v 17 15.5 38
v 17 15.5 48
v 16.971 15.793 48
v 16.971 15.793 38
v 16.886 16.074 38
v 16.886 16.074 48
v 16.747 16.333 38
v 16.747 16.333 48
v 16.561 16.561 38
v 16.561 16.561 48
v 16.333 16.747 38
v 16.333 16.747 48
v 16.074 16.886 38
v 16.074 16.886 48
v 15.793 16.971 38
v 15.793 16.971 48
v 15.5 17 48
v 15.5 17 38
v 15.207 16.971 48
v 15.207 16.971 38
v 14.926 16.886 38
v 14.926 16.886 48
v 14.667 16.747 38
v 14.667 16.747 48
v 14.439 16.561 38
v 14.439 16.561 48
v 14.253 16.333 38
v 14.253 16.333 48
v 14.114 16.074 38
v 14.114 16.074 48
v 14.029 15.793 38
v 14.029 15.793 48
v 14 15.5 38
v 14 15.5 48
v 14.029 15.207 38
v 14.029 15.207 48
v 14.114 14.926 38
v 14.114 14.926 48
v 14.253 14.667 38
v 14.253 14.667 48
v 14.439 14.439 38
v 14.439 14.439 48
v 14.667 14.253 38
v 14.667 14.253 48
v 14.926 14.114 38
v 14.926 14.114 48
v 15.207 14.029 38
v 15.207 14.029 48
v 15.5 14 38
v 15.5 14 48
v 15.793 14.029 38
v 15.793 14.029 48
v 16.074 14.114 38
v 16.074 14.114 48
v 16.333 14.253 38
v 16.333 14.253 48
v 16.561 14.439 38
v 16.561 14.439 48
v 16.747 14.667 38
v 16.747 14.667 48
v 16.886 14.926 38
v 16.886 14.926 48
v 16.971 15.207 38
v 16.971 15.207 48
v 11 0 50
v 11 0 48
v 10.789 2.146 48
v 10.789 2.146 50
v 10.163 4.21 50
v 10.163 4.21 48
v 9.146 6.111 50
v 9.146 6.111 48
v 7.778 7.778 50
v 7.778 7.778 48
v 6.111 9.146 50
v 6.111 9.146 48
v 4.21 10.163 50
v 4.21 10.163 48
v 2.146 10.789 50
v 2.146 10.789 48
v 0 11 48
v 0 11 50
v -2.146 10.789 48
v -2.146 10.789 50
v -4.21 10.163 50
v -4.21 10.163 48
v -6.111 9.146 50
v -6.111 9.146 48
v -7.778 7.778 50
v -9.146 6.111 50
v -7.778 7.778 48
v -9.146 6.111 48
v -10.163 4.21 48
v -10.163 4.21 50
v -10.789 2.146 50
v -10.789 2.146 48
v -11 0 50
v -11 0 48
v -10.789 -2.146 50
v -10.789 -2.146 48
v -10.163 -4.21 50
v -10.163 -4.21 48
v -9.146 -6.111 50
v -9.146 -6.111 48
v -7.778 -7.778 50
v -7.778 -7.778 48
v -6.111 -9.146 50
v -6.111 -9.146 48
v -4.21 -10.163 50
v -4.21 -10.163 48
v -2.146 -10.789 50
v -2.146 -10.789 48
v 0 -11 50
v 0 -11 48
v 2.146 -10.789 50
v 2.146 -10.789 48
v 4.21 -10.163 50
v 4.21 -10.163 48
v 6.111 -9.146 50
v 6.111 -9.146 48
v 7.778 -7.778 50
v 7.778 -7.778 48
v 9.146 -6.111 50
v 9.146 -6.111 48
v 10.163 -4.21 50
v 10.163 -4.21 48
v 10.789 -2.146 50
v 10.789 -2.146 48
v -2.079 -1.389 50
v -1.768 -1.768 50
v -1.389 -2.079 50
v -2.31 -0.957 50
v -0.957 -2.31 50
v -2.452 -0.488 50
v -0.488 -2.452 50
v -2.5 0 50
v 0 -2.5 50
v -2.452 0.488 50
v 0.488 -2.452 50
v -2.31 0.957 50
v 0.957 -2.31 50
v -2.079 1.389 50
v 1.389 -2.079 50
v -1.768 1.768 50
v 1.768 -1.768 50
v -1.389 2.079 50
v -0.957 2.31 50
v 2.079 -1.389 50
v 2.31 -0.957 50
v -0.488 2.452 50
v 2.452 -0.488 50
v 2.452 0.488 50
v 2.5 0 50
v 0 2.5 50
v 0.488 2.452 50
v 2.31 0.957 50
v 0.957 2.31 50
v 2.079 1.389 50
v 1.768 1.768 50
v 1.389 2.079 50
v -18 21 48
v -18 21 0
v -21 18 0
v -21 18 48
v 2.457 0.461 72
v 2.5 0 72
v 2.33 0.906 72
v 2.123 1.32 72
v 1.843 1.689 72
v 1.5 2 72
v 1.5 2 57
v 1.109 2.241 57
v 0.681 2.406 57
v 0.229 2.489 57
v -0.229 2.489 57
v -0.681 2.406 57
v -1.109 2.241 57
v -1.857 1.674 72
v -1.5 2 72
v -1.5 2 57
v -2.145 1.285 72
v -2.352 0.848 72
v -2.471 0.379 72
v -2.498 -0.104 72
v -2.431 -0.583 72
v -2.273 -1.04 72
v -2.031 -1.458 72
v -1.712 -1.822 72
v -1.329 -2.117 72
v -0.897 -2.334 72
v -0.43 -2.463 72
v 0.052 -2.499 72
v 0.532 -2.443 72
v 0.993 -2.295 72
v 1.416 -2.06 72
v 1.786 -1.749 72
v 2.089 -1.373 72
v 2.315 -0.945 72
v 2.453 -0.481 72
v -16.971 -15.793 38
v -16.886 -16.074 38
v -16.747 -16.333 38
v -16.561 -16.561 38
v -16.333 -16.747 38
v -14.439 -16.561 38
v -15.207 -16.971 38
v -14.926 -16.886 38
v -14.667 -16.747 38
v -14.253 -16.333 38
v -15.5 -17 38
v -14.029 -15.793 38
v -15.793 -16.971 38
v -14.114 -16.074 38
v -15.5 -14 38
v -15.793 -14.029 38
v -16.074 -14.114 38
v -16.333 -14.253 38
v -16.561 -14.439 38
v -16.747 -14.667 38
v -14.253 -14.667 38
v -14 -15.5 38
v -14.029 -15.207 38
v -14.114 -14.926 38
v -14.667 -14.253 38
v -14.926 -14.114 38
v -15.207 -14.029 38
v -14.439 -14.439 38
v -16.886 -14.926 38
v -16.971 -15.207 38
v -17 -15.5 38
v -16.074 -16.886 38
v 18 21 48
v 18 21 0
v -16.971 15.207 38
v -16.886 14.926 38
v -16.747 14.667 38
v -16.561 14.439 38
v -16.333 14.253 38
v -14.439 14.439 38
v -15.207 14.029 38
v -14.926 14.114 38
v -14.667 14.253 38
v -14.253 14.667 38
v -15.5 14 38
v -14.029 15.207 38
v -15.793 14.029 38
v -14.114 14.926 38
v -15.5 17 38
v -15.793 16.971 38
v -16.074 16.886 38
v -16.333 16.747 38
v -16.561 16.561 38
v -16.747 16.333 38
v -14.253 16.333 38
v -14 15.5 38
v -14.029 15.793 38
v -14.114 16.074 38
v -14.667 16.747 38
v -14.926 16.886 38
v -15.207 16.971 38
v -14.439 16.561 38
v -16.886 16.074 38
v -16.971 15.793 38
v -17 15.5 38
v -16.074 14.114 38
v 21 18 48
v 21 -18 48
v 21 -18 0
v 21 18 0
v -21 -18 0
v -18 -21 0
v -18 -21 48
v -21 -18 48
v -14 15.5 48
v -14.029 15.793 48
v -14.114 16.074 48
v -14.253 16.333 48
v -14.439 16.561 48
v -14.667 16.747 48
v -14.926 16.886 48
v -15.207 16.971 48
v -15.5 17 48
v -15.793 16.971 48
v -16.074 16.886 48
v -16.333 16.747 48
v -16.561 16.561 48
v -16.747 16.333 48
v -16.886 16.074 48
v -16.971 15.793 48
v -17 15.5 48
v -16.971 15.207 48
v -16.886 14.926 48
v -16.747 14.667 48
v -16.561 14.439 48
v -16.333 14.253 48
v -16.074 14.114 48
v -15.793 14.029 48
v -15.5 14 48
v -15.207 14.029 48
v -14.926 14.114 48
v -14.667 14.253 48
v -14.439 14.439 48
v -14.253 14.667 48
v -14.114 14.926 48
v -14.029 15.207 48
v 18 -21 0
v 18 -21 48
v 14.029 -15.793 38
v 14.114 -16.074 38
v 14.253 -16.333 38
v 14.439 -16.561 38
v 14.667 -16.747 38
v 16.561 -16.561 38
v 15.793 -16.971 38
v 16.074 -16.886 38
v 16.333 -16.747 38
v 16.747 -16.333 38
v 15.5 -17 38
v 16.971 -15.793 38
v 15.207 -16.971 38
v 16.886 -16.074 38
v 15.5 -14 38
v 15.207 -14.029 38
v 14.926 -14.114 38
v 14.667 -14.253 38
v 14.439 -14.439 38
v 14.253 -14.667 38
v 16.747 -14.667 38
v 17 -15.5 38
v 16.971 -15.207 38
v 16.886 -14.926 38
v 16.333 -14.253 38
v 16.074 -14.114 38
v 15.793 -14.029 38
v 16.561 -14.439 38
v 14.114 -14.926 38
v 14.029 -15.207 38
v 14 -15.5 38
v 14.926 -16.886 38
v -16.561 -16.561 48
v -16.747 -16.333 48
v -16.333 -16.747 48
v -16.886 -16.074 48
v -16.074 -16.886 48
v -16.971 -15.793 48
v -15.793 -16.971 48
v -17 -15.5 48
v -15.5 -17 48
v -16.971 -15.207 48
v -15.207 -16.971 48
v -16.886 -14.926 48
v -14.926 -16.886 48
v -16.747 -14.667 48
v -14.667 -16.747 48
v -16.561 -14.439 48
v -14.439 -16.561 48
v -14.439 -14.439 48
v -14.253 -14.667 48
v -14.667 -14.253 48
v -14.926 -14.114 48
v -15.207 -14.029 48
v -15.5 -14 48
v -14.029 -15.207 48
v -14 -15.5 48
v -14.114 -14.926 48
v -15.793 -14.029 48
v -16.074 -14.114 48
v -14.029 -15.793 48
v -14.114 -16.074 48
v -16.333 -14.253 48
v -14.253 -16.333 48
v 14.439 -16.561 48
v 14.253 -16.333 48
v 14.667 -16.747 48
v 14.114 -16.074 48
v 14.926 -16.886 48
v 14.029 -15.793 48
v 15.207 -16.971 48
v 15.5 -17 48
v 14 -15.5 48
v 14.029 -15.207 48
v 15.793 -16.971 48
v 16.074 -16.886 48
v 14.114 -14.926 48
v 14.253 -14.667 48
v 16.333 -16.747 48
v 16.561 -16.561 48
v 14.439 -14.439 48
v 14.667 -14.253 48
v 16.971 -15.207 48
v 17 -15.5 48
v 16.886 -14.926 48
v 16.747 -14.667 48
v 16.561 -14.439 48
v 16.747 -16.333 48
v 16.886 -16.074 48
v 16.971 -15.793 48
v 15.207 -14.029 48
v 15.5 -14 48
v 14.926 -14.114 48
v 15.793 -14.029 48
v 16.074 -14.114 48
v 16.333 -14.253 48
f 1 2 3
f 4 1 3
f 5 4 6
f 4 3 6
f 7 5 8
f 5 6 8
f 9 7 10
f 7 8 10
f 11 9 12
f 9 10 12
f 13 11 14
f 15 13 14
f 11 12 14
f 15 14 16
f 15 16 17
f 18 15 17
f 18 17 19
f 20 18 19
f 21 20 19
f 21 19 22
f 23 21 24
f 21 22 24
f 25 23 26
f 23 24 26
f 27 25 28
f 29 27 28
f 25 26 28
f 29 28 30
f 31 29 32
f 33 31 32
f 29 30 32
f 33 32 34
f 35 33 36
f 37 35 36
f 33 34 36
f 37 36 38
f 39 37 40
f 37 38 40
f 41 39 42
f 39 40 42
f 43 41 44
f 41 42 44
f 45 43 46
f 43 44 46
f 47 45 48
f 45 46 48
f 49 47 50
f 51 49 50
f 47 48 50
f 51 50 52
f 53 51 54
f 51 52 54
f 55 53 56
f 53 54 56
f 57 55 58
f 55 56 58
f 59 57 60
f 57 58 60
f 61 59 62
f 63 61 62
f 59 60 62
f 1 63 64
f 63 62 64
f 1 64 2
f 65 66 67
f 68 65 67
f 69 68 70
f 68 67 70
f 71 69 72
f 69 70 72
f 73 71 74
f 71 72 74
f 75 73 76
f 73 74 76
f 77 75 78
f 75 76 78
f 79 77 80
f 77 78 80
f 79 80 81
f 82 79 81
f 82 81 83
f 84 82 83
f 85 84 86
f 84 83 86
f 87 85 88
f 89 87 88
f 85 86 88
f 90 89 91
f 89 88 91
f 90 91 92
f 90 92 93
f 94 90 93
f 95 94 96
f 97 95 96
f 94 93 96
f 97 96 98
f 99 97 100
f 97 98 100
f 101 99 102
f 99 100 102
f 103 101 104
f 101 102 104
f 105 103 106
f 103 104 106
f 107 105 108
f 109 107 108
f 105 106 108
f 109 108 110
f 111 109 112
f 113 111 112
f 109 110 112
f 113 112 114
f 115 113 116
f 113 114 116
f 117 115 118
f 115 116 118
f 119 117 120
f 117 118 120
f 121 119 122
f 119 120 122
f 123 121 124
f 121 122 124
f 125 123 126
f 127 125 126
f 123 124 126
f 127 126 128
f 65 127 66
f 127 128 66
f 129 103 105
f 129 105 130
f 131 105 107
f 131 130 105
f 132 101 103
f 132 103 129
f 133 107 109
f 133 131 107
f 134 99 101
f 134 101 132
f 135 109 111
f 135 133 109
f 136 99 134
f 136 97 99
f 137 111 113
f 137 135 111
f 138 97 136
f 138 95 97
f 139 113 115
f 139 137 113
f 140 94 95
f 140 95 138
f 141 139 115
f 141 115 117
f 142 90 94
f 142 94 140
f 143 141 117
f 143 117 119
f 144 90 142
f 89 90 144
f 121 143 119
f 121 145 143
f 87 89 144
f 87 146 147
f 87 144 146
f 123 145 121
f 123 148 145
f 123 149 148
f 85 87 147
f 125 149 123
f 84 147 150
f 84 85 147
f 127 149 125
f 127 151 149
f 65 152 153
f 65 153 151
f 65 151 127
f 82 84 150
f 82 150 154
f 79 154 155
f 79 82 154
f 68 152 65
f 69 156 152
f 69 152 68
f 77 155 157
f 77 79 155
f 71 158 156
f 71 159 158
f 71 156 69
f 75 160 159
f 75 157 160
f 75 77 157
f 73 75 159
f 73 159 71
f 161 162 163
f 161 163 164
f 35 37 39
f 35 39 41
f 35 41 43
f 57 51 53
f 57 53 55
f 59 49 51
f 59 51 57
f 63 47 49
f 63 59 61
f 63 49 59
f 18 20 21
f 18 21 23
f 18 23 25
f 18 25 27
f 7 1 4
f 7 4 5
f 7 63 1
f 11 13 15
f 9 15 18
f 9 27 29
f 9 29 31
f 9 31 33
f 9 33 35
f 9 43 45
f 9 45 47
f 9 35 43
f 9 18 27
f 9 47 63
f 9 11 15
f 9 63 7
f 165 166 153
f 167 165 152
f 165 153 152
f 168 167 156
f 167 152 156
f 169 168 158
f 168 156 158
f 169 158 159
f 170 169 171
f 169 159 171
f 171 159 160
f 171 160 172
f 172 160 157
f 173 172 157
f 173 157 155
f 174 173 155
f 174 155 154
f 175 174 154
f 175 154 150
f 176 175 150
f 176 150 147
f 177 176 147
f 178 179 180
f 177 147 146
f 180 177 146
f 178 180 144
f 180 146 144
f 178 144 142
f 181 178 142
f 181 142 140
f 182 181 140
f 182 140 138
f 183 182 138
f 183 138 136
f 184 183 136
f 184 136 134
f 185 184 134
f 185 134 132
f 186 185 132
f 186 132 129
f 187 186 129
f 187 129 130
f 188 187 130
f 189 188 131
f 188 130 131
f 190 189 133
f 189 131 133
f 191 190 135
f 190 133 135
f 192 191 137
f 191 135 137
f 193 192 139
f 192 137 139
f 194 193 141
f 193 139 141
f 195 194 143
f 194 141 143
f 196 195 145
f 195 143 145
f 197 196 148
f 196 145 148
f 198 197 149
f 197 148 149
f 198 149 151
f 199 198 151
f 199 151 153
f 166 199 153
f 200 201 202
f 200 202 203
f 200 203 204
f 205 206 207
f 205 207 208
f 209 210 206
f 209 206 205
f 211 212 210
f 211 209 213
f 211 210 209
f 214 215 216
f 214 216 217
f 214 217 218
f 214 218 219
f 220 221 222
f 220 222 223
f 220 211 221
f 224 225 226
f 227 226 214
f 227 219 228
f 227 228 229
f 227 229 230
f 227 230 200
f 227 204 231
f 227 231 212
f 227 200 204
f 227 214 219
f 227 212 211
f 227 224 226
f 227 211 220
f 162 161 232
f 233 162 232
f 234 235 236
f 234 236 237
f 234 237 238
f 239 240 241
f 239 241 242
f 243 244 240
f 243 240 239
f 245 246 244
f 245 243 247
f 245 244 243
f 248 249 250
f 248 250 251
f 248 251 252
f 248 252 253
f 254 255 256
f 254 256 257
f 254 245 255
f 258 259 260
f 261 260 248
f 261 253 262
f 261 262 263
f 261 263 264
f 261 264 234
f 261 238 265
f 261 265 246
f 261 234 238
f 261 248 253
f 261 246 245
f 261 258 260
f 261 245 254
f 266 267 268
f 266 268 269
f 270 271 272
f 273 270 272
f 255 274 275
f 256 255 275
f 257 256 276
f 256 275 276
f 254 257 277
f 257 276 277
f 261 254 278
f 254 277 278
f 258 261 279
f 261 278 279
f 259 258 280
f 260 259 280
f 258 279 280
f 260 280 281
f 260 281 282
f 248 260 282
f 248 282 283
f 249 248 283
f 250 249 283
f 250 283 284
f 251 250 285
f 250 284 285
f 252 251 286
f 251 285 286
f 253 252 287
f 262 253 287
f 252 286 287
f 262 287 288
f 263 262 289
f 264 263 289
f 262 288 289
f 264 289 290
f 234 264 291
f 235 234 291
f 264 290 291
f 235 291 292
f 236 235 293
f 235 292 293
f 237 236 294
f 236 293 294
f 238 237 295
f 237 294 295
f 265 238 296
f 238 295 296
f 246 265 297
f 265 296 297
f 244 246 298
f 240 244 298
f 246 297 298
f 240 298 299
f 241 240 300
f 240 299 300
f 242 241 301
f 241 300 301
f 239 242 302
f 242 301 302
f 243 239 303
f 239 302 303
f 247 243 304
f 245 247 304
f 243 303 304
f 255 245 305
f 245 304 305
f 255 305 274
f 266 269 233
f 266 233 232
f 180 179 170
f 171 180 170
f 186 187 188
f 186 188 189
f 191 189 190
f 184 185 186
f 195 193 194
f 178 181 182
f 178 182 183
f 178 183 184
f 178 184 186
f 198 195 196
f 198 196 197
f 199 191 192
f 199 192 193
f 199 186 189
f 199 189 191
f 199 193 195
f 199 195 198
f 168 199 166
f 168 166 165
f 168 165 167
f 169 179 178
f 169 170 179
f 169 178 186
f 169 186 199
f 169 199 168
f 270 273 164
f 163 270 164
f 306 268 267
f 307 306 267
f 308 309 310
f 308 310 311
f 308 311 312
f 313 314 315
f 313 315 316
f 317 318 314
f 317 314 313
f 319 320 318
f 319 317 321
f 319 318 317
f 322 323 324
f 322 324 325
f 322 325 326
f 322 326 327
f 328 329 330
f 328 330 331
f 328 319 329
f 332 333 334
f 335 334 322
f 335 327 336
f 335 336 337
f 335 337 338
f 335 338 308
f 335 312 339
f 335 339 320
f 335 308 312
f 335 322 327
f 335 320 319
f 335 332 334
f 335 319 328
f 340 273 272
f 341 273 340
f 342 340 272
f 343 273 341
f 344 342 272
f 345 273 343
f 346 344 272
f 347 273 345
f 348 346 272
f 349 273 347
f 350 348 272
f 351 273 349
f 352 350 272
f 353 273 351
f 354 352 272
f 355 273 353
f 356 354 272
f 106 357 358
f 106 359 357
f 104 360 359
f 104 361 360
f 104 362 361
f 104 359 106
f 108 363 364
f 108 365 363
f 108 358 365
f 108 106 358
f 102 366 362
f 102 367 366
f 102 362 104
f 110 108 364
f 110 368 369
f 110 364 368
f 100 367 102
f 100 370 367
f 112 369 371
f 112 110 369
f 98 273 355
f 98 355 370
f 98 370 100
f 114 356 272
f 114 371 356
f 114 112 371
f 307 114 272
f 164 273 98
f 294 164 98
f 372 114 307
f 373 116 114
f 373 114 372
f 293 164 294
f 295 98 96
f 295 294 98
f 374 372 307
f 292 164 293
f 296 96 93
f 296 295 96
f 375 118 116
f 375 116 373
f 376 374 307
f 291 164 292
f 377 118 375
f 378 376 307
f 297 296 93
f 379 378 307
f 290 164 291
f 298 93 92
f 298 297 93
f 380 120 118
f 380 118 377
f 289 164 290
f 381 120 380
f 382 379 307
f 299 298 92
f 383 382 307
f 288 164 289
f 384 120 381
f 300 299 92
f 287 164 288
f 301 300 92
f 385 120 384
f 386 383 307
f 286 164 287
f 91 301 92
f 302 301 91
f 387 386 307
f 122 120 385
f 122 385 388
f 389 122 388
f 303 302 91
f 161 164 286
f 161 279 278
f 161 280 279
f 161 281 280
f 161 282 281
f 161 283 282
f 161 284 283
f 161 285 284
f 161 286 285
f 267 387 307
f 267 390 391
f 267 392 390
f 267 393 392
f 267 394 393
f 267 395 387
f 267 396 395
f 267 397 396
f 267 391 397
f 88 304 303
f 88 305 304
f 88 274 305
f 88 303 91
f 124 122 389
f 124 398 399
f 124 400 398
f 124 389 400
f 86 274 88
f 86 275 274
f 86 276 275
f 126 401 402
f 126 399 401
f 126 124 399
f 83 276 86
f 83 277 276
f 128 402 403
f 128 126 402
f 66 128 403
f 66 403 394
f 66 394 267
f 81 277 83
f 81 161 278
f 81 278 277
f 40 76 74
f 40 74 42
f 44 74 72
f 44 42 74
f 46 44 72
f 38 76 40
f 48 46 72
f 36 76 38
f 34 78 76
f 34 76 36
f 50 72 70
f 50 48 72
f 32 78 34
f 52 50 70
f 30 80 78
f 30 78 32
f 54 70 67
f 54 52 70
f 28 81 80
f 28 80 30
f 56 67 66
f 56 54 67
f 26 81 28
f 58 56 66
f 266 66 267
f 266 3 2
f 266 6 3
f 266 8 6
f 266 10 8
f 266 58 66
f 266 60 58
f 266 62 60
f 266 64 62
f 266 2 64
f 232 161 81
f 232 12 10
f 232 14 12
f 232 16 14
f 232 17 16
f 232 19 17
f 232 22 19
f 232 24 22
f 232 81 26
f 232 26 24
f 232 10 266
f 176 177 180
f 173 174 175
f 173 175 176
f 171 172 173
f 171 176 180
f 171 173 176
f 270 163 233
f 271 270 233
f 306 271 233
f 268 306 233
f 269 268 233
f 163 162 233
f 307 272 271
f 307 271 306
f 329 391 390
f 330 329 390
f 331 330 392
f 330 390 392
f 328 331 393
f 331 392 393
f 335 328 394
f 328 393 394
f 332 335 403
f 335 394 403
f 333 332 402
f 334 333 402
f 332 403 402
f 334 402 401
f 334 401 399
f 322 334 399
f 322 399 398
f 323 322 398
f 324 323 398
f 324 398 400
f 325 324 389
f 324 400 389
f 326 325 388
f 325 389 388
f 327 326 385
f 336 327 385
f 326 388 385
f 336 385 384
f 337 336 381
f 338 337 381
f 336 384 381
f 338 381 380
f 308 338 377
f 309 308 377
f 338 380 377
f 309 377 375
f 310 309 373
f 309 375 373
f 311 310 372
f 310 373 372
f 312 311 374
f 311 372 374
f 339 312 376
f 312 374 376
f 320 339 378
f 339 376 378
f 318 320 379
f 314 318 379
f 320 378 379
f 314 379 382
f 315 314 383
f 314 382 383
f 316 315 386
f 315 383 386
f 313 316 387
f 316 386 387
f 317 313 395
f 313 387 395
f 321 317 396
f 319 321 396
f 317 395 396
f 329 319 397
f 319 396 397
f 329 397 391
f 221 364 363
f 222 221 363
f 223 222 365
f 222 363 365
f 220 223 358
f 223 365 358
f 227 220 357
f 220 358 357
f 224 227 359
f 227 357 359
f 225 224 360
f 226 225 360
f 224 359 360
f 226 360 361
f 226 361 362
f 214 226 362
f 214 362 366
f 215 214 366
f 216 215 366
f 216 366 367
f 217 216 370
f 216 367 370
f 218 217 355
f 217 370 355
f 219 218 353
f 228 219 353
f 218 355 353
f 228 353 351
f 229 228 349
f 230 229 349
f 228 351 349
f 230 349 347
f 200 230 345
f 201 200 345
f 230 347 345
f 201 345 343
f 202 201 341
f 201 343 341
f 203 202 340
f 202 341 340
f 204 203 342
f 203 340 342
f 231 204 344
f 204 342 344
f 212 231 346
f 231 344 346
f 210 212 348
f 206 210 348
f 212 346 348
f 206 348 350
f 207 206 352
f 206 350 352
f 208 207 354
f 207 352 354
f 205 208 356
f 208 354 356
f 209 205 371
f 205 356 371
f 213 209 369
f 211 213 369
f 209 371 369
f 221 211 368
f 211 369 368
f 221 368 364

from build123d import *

# Parameters (mm, degrees)
F0_W     = 42
F0_H     = 42
F1_DEPTH = 48
F2_R     = 1.5
F3_DEPTH = 10
F2_R_2   = 11
F4_DEPTH = 2
F5_R     = 2.5
F6_DEPTH = 22
F8_DEPTH = 15
F9_SIZE  = 3


with BuildPart() as f1:
    # F0 (on Top) → F1 (new body)
    with BuildSketch(Plane.XY):
        Rectangle(F0_W, F0_H)
    extrude(amount=F1_DEPTH)

    # F2 (on face) → F3 (cut)
    with BuildSketch(Plane.XY.offset(48)):
        with Locations((-15.5, -15.5)):
            Circle(F2_R)
        with Locations((-15.5, 15.5)):
            Circle(F2_R)
        with Locations((15.5, 15.5)):
            Circle(F2_R)
        with Locations((15.5, -15.5)):
            Circle(F2_R)
    extrude(amount=-F3_DEPTH, mode=Mode.SUBTRACT)

    # F2 (on face) → F4 (join)
    with BuildSketch(Plane.XY.offset(48)):
        Circle(F2_R_2)
    extrude(amount=F4_DEPTH)

    # F5 (on face) → F6 (join)
    with BuildSketch(Plane.XY.offset(50)):
        Circle(F5_R)
    extrude(amount=F6_DEPTH)

    # F7 (on face) → F8 (cut)
    with BuildSketch(Plane.XY.offset(72)):
        with BuildLine():
            ThreePointArc((1.5, 2), (0, 2.5), (-1.5, 2))
            Line((-1.5, 2), (1.5, 2))
        make_face()
    extrude(amount=-F8_DEPTH, mode=Mode.SUBTRACT)

    # F9
    f9_edges = [f1.edges().sort_by_distance(p)[0] for p in [
        (21, -21, 24),
        (21, 21, 24),
        (-21, -21, 24),
        (-21, 21, 24),
    ]]
    chamfer(f9_edges, length=F9_SIZE)


solid = f1.part
